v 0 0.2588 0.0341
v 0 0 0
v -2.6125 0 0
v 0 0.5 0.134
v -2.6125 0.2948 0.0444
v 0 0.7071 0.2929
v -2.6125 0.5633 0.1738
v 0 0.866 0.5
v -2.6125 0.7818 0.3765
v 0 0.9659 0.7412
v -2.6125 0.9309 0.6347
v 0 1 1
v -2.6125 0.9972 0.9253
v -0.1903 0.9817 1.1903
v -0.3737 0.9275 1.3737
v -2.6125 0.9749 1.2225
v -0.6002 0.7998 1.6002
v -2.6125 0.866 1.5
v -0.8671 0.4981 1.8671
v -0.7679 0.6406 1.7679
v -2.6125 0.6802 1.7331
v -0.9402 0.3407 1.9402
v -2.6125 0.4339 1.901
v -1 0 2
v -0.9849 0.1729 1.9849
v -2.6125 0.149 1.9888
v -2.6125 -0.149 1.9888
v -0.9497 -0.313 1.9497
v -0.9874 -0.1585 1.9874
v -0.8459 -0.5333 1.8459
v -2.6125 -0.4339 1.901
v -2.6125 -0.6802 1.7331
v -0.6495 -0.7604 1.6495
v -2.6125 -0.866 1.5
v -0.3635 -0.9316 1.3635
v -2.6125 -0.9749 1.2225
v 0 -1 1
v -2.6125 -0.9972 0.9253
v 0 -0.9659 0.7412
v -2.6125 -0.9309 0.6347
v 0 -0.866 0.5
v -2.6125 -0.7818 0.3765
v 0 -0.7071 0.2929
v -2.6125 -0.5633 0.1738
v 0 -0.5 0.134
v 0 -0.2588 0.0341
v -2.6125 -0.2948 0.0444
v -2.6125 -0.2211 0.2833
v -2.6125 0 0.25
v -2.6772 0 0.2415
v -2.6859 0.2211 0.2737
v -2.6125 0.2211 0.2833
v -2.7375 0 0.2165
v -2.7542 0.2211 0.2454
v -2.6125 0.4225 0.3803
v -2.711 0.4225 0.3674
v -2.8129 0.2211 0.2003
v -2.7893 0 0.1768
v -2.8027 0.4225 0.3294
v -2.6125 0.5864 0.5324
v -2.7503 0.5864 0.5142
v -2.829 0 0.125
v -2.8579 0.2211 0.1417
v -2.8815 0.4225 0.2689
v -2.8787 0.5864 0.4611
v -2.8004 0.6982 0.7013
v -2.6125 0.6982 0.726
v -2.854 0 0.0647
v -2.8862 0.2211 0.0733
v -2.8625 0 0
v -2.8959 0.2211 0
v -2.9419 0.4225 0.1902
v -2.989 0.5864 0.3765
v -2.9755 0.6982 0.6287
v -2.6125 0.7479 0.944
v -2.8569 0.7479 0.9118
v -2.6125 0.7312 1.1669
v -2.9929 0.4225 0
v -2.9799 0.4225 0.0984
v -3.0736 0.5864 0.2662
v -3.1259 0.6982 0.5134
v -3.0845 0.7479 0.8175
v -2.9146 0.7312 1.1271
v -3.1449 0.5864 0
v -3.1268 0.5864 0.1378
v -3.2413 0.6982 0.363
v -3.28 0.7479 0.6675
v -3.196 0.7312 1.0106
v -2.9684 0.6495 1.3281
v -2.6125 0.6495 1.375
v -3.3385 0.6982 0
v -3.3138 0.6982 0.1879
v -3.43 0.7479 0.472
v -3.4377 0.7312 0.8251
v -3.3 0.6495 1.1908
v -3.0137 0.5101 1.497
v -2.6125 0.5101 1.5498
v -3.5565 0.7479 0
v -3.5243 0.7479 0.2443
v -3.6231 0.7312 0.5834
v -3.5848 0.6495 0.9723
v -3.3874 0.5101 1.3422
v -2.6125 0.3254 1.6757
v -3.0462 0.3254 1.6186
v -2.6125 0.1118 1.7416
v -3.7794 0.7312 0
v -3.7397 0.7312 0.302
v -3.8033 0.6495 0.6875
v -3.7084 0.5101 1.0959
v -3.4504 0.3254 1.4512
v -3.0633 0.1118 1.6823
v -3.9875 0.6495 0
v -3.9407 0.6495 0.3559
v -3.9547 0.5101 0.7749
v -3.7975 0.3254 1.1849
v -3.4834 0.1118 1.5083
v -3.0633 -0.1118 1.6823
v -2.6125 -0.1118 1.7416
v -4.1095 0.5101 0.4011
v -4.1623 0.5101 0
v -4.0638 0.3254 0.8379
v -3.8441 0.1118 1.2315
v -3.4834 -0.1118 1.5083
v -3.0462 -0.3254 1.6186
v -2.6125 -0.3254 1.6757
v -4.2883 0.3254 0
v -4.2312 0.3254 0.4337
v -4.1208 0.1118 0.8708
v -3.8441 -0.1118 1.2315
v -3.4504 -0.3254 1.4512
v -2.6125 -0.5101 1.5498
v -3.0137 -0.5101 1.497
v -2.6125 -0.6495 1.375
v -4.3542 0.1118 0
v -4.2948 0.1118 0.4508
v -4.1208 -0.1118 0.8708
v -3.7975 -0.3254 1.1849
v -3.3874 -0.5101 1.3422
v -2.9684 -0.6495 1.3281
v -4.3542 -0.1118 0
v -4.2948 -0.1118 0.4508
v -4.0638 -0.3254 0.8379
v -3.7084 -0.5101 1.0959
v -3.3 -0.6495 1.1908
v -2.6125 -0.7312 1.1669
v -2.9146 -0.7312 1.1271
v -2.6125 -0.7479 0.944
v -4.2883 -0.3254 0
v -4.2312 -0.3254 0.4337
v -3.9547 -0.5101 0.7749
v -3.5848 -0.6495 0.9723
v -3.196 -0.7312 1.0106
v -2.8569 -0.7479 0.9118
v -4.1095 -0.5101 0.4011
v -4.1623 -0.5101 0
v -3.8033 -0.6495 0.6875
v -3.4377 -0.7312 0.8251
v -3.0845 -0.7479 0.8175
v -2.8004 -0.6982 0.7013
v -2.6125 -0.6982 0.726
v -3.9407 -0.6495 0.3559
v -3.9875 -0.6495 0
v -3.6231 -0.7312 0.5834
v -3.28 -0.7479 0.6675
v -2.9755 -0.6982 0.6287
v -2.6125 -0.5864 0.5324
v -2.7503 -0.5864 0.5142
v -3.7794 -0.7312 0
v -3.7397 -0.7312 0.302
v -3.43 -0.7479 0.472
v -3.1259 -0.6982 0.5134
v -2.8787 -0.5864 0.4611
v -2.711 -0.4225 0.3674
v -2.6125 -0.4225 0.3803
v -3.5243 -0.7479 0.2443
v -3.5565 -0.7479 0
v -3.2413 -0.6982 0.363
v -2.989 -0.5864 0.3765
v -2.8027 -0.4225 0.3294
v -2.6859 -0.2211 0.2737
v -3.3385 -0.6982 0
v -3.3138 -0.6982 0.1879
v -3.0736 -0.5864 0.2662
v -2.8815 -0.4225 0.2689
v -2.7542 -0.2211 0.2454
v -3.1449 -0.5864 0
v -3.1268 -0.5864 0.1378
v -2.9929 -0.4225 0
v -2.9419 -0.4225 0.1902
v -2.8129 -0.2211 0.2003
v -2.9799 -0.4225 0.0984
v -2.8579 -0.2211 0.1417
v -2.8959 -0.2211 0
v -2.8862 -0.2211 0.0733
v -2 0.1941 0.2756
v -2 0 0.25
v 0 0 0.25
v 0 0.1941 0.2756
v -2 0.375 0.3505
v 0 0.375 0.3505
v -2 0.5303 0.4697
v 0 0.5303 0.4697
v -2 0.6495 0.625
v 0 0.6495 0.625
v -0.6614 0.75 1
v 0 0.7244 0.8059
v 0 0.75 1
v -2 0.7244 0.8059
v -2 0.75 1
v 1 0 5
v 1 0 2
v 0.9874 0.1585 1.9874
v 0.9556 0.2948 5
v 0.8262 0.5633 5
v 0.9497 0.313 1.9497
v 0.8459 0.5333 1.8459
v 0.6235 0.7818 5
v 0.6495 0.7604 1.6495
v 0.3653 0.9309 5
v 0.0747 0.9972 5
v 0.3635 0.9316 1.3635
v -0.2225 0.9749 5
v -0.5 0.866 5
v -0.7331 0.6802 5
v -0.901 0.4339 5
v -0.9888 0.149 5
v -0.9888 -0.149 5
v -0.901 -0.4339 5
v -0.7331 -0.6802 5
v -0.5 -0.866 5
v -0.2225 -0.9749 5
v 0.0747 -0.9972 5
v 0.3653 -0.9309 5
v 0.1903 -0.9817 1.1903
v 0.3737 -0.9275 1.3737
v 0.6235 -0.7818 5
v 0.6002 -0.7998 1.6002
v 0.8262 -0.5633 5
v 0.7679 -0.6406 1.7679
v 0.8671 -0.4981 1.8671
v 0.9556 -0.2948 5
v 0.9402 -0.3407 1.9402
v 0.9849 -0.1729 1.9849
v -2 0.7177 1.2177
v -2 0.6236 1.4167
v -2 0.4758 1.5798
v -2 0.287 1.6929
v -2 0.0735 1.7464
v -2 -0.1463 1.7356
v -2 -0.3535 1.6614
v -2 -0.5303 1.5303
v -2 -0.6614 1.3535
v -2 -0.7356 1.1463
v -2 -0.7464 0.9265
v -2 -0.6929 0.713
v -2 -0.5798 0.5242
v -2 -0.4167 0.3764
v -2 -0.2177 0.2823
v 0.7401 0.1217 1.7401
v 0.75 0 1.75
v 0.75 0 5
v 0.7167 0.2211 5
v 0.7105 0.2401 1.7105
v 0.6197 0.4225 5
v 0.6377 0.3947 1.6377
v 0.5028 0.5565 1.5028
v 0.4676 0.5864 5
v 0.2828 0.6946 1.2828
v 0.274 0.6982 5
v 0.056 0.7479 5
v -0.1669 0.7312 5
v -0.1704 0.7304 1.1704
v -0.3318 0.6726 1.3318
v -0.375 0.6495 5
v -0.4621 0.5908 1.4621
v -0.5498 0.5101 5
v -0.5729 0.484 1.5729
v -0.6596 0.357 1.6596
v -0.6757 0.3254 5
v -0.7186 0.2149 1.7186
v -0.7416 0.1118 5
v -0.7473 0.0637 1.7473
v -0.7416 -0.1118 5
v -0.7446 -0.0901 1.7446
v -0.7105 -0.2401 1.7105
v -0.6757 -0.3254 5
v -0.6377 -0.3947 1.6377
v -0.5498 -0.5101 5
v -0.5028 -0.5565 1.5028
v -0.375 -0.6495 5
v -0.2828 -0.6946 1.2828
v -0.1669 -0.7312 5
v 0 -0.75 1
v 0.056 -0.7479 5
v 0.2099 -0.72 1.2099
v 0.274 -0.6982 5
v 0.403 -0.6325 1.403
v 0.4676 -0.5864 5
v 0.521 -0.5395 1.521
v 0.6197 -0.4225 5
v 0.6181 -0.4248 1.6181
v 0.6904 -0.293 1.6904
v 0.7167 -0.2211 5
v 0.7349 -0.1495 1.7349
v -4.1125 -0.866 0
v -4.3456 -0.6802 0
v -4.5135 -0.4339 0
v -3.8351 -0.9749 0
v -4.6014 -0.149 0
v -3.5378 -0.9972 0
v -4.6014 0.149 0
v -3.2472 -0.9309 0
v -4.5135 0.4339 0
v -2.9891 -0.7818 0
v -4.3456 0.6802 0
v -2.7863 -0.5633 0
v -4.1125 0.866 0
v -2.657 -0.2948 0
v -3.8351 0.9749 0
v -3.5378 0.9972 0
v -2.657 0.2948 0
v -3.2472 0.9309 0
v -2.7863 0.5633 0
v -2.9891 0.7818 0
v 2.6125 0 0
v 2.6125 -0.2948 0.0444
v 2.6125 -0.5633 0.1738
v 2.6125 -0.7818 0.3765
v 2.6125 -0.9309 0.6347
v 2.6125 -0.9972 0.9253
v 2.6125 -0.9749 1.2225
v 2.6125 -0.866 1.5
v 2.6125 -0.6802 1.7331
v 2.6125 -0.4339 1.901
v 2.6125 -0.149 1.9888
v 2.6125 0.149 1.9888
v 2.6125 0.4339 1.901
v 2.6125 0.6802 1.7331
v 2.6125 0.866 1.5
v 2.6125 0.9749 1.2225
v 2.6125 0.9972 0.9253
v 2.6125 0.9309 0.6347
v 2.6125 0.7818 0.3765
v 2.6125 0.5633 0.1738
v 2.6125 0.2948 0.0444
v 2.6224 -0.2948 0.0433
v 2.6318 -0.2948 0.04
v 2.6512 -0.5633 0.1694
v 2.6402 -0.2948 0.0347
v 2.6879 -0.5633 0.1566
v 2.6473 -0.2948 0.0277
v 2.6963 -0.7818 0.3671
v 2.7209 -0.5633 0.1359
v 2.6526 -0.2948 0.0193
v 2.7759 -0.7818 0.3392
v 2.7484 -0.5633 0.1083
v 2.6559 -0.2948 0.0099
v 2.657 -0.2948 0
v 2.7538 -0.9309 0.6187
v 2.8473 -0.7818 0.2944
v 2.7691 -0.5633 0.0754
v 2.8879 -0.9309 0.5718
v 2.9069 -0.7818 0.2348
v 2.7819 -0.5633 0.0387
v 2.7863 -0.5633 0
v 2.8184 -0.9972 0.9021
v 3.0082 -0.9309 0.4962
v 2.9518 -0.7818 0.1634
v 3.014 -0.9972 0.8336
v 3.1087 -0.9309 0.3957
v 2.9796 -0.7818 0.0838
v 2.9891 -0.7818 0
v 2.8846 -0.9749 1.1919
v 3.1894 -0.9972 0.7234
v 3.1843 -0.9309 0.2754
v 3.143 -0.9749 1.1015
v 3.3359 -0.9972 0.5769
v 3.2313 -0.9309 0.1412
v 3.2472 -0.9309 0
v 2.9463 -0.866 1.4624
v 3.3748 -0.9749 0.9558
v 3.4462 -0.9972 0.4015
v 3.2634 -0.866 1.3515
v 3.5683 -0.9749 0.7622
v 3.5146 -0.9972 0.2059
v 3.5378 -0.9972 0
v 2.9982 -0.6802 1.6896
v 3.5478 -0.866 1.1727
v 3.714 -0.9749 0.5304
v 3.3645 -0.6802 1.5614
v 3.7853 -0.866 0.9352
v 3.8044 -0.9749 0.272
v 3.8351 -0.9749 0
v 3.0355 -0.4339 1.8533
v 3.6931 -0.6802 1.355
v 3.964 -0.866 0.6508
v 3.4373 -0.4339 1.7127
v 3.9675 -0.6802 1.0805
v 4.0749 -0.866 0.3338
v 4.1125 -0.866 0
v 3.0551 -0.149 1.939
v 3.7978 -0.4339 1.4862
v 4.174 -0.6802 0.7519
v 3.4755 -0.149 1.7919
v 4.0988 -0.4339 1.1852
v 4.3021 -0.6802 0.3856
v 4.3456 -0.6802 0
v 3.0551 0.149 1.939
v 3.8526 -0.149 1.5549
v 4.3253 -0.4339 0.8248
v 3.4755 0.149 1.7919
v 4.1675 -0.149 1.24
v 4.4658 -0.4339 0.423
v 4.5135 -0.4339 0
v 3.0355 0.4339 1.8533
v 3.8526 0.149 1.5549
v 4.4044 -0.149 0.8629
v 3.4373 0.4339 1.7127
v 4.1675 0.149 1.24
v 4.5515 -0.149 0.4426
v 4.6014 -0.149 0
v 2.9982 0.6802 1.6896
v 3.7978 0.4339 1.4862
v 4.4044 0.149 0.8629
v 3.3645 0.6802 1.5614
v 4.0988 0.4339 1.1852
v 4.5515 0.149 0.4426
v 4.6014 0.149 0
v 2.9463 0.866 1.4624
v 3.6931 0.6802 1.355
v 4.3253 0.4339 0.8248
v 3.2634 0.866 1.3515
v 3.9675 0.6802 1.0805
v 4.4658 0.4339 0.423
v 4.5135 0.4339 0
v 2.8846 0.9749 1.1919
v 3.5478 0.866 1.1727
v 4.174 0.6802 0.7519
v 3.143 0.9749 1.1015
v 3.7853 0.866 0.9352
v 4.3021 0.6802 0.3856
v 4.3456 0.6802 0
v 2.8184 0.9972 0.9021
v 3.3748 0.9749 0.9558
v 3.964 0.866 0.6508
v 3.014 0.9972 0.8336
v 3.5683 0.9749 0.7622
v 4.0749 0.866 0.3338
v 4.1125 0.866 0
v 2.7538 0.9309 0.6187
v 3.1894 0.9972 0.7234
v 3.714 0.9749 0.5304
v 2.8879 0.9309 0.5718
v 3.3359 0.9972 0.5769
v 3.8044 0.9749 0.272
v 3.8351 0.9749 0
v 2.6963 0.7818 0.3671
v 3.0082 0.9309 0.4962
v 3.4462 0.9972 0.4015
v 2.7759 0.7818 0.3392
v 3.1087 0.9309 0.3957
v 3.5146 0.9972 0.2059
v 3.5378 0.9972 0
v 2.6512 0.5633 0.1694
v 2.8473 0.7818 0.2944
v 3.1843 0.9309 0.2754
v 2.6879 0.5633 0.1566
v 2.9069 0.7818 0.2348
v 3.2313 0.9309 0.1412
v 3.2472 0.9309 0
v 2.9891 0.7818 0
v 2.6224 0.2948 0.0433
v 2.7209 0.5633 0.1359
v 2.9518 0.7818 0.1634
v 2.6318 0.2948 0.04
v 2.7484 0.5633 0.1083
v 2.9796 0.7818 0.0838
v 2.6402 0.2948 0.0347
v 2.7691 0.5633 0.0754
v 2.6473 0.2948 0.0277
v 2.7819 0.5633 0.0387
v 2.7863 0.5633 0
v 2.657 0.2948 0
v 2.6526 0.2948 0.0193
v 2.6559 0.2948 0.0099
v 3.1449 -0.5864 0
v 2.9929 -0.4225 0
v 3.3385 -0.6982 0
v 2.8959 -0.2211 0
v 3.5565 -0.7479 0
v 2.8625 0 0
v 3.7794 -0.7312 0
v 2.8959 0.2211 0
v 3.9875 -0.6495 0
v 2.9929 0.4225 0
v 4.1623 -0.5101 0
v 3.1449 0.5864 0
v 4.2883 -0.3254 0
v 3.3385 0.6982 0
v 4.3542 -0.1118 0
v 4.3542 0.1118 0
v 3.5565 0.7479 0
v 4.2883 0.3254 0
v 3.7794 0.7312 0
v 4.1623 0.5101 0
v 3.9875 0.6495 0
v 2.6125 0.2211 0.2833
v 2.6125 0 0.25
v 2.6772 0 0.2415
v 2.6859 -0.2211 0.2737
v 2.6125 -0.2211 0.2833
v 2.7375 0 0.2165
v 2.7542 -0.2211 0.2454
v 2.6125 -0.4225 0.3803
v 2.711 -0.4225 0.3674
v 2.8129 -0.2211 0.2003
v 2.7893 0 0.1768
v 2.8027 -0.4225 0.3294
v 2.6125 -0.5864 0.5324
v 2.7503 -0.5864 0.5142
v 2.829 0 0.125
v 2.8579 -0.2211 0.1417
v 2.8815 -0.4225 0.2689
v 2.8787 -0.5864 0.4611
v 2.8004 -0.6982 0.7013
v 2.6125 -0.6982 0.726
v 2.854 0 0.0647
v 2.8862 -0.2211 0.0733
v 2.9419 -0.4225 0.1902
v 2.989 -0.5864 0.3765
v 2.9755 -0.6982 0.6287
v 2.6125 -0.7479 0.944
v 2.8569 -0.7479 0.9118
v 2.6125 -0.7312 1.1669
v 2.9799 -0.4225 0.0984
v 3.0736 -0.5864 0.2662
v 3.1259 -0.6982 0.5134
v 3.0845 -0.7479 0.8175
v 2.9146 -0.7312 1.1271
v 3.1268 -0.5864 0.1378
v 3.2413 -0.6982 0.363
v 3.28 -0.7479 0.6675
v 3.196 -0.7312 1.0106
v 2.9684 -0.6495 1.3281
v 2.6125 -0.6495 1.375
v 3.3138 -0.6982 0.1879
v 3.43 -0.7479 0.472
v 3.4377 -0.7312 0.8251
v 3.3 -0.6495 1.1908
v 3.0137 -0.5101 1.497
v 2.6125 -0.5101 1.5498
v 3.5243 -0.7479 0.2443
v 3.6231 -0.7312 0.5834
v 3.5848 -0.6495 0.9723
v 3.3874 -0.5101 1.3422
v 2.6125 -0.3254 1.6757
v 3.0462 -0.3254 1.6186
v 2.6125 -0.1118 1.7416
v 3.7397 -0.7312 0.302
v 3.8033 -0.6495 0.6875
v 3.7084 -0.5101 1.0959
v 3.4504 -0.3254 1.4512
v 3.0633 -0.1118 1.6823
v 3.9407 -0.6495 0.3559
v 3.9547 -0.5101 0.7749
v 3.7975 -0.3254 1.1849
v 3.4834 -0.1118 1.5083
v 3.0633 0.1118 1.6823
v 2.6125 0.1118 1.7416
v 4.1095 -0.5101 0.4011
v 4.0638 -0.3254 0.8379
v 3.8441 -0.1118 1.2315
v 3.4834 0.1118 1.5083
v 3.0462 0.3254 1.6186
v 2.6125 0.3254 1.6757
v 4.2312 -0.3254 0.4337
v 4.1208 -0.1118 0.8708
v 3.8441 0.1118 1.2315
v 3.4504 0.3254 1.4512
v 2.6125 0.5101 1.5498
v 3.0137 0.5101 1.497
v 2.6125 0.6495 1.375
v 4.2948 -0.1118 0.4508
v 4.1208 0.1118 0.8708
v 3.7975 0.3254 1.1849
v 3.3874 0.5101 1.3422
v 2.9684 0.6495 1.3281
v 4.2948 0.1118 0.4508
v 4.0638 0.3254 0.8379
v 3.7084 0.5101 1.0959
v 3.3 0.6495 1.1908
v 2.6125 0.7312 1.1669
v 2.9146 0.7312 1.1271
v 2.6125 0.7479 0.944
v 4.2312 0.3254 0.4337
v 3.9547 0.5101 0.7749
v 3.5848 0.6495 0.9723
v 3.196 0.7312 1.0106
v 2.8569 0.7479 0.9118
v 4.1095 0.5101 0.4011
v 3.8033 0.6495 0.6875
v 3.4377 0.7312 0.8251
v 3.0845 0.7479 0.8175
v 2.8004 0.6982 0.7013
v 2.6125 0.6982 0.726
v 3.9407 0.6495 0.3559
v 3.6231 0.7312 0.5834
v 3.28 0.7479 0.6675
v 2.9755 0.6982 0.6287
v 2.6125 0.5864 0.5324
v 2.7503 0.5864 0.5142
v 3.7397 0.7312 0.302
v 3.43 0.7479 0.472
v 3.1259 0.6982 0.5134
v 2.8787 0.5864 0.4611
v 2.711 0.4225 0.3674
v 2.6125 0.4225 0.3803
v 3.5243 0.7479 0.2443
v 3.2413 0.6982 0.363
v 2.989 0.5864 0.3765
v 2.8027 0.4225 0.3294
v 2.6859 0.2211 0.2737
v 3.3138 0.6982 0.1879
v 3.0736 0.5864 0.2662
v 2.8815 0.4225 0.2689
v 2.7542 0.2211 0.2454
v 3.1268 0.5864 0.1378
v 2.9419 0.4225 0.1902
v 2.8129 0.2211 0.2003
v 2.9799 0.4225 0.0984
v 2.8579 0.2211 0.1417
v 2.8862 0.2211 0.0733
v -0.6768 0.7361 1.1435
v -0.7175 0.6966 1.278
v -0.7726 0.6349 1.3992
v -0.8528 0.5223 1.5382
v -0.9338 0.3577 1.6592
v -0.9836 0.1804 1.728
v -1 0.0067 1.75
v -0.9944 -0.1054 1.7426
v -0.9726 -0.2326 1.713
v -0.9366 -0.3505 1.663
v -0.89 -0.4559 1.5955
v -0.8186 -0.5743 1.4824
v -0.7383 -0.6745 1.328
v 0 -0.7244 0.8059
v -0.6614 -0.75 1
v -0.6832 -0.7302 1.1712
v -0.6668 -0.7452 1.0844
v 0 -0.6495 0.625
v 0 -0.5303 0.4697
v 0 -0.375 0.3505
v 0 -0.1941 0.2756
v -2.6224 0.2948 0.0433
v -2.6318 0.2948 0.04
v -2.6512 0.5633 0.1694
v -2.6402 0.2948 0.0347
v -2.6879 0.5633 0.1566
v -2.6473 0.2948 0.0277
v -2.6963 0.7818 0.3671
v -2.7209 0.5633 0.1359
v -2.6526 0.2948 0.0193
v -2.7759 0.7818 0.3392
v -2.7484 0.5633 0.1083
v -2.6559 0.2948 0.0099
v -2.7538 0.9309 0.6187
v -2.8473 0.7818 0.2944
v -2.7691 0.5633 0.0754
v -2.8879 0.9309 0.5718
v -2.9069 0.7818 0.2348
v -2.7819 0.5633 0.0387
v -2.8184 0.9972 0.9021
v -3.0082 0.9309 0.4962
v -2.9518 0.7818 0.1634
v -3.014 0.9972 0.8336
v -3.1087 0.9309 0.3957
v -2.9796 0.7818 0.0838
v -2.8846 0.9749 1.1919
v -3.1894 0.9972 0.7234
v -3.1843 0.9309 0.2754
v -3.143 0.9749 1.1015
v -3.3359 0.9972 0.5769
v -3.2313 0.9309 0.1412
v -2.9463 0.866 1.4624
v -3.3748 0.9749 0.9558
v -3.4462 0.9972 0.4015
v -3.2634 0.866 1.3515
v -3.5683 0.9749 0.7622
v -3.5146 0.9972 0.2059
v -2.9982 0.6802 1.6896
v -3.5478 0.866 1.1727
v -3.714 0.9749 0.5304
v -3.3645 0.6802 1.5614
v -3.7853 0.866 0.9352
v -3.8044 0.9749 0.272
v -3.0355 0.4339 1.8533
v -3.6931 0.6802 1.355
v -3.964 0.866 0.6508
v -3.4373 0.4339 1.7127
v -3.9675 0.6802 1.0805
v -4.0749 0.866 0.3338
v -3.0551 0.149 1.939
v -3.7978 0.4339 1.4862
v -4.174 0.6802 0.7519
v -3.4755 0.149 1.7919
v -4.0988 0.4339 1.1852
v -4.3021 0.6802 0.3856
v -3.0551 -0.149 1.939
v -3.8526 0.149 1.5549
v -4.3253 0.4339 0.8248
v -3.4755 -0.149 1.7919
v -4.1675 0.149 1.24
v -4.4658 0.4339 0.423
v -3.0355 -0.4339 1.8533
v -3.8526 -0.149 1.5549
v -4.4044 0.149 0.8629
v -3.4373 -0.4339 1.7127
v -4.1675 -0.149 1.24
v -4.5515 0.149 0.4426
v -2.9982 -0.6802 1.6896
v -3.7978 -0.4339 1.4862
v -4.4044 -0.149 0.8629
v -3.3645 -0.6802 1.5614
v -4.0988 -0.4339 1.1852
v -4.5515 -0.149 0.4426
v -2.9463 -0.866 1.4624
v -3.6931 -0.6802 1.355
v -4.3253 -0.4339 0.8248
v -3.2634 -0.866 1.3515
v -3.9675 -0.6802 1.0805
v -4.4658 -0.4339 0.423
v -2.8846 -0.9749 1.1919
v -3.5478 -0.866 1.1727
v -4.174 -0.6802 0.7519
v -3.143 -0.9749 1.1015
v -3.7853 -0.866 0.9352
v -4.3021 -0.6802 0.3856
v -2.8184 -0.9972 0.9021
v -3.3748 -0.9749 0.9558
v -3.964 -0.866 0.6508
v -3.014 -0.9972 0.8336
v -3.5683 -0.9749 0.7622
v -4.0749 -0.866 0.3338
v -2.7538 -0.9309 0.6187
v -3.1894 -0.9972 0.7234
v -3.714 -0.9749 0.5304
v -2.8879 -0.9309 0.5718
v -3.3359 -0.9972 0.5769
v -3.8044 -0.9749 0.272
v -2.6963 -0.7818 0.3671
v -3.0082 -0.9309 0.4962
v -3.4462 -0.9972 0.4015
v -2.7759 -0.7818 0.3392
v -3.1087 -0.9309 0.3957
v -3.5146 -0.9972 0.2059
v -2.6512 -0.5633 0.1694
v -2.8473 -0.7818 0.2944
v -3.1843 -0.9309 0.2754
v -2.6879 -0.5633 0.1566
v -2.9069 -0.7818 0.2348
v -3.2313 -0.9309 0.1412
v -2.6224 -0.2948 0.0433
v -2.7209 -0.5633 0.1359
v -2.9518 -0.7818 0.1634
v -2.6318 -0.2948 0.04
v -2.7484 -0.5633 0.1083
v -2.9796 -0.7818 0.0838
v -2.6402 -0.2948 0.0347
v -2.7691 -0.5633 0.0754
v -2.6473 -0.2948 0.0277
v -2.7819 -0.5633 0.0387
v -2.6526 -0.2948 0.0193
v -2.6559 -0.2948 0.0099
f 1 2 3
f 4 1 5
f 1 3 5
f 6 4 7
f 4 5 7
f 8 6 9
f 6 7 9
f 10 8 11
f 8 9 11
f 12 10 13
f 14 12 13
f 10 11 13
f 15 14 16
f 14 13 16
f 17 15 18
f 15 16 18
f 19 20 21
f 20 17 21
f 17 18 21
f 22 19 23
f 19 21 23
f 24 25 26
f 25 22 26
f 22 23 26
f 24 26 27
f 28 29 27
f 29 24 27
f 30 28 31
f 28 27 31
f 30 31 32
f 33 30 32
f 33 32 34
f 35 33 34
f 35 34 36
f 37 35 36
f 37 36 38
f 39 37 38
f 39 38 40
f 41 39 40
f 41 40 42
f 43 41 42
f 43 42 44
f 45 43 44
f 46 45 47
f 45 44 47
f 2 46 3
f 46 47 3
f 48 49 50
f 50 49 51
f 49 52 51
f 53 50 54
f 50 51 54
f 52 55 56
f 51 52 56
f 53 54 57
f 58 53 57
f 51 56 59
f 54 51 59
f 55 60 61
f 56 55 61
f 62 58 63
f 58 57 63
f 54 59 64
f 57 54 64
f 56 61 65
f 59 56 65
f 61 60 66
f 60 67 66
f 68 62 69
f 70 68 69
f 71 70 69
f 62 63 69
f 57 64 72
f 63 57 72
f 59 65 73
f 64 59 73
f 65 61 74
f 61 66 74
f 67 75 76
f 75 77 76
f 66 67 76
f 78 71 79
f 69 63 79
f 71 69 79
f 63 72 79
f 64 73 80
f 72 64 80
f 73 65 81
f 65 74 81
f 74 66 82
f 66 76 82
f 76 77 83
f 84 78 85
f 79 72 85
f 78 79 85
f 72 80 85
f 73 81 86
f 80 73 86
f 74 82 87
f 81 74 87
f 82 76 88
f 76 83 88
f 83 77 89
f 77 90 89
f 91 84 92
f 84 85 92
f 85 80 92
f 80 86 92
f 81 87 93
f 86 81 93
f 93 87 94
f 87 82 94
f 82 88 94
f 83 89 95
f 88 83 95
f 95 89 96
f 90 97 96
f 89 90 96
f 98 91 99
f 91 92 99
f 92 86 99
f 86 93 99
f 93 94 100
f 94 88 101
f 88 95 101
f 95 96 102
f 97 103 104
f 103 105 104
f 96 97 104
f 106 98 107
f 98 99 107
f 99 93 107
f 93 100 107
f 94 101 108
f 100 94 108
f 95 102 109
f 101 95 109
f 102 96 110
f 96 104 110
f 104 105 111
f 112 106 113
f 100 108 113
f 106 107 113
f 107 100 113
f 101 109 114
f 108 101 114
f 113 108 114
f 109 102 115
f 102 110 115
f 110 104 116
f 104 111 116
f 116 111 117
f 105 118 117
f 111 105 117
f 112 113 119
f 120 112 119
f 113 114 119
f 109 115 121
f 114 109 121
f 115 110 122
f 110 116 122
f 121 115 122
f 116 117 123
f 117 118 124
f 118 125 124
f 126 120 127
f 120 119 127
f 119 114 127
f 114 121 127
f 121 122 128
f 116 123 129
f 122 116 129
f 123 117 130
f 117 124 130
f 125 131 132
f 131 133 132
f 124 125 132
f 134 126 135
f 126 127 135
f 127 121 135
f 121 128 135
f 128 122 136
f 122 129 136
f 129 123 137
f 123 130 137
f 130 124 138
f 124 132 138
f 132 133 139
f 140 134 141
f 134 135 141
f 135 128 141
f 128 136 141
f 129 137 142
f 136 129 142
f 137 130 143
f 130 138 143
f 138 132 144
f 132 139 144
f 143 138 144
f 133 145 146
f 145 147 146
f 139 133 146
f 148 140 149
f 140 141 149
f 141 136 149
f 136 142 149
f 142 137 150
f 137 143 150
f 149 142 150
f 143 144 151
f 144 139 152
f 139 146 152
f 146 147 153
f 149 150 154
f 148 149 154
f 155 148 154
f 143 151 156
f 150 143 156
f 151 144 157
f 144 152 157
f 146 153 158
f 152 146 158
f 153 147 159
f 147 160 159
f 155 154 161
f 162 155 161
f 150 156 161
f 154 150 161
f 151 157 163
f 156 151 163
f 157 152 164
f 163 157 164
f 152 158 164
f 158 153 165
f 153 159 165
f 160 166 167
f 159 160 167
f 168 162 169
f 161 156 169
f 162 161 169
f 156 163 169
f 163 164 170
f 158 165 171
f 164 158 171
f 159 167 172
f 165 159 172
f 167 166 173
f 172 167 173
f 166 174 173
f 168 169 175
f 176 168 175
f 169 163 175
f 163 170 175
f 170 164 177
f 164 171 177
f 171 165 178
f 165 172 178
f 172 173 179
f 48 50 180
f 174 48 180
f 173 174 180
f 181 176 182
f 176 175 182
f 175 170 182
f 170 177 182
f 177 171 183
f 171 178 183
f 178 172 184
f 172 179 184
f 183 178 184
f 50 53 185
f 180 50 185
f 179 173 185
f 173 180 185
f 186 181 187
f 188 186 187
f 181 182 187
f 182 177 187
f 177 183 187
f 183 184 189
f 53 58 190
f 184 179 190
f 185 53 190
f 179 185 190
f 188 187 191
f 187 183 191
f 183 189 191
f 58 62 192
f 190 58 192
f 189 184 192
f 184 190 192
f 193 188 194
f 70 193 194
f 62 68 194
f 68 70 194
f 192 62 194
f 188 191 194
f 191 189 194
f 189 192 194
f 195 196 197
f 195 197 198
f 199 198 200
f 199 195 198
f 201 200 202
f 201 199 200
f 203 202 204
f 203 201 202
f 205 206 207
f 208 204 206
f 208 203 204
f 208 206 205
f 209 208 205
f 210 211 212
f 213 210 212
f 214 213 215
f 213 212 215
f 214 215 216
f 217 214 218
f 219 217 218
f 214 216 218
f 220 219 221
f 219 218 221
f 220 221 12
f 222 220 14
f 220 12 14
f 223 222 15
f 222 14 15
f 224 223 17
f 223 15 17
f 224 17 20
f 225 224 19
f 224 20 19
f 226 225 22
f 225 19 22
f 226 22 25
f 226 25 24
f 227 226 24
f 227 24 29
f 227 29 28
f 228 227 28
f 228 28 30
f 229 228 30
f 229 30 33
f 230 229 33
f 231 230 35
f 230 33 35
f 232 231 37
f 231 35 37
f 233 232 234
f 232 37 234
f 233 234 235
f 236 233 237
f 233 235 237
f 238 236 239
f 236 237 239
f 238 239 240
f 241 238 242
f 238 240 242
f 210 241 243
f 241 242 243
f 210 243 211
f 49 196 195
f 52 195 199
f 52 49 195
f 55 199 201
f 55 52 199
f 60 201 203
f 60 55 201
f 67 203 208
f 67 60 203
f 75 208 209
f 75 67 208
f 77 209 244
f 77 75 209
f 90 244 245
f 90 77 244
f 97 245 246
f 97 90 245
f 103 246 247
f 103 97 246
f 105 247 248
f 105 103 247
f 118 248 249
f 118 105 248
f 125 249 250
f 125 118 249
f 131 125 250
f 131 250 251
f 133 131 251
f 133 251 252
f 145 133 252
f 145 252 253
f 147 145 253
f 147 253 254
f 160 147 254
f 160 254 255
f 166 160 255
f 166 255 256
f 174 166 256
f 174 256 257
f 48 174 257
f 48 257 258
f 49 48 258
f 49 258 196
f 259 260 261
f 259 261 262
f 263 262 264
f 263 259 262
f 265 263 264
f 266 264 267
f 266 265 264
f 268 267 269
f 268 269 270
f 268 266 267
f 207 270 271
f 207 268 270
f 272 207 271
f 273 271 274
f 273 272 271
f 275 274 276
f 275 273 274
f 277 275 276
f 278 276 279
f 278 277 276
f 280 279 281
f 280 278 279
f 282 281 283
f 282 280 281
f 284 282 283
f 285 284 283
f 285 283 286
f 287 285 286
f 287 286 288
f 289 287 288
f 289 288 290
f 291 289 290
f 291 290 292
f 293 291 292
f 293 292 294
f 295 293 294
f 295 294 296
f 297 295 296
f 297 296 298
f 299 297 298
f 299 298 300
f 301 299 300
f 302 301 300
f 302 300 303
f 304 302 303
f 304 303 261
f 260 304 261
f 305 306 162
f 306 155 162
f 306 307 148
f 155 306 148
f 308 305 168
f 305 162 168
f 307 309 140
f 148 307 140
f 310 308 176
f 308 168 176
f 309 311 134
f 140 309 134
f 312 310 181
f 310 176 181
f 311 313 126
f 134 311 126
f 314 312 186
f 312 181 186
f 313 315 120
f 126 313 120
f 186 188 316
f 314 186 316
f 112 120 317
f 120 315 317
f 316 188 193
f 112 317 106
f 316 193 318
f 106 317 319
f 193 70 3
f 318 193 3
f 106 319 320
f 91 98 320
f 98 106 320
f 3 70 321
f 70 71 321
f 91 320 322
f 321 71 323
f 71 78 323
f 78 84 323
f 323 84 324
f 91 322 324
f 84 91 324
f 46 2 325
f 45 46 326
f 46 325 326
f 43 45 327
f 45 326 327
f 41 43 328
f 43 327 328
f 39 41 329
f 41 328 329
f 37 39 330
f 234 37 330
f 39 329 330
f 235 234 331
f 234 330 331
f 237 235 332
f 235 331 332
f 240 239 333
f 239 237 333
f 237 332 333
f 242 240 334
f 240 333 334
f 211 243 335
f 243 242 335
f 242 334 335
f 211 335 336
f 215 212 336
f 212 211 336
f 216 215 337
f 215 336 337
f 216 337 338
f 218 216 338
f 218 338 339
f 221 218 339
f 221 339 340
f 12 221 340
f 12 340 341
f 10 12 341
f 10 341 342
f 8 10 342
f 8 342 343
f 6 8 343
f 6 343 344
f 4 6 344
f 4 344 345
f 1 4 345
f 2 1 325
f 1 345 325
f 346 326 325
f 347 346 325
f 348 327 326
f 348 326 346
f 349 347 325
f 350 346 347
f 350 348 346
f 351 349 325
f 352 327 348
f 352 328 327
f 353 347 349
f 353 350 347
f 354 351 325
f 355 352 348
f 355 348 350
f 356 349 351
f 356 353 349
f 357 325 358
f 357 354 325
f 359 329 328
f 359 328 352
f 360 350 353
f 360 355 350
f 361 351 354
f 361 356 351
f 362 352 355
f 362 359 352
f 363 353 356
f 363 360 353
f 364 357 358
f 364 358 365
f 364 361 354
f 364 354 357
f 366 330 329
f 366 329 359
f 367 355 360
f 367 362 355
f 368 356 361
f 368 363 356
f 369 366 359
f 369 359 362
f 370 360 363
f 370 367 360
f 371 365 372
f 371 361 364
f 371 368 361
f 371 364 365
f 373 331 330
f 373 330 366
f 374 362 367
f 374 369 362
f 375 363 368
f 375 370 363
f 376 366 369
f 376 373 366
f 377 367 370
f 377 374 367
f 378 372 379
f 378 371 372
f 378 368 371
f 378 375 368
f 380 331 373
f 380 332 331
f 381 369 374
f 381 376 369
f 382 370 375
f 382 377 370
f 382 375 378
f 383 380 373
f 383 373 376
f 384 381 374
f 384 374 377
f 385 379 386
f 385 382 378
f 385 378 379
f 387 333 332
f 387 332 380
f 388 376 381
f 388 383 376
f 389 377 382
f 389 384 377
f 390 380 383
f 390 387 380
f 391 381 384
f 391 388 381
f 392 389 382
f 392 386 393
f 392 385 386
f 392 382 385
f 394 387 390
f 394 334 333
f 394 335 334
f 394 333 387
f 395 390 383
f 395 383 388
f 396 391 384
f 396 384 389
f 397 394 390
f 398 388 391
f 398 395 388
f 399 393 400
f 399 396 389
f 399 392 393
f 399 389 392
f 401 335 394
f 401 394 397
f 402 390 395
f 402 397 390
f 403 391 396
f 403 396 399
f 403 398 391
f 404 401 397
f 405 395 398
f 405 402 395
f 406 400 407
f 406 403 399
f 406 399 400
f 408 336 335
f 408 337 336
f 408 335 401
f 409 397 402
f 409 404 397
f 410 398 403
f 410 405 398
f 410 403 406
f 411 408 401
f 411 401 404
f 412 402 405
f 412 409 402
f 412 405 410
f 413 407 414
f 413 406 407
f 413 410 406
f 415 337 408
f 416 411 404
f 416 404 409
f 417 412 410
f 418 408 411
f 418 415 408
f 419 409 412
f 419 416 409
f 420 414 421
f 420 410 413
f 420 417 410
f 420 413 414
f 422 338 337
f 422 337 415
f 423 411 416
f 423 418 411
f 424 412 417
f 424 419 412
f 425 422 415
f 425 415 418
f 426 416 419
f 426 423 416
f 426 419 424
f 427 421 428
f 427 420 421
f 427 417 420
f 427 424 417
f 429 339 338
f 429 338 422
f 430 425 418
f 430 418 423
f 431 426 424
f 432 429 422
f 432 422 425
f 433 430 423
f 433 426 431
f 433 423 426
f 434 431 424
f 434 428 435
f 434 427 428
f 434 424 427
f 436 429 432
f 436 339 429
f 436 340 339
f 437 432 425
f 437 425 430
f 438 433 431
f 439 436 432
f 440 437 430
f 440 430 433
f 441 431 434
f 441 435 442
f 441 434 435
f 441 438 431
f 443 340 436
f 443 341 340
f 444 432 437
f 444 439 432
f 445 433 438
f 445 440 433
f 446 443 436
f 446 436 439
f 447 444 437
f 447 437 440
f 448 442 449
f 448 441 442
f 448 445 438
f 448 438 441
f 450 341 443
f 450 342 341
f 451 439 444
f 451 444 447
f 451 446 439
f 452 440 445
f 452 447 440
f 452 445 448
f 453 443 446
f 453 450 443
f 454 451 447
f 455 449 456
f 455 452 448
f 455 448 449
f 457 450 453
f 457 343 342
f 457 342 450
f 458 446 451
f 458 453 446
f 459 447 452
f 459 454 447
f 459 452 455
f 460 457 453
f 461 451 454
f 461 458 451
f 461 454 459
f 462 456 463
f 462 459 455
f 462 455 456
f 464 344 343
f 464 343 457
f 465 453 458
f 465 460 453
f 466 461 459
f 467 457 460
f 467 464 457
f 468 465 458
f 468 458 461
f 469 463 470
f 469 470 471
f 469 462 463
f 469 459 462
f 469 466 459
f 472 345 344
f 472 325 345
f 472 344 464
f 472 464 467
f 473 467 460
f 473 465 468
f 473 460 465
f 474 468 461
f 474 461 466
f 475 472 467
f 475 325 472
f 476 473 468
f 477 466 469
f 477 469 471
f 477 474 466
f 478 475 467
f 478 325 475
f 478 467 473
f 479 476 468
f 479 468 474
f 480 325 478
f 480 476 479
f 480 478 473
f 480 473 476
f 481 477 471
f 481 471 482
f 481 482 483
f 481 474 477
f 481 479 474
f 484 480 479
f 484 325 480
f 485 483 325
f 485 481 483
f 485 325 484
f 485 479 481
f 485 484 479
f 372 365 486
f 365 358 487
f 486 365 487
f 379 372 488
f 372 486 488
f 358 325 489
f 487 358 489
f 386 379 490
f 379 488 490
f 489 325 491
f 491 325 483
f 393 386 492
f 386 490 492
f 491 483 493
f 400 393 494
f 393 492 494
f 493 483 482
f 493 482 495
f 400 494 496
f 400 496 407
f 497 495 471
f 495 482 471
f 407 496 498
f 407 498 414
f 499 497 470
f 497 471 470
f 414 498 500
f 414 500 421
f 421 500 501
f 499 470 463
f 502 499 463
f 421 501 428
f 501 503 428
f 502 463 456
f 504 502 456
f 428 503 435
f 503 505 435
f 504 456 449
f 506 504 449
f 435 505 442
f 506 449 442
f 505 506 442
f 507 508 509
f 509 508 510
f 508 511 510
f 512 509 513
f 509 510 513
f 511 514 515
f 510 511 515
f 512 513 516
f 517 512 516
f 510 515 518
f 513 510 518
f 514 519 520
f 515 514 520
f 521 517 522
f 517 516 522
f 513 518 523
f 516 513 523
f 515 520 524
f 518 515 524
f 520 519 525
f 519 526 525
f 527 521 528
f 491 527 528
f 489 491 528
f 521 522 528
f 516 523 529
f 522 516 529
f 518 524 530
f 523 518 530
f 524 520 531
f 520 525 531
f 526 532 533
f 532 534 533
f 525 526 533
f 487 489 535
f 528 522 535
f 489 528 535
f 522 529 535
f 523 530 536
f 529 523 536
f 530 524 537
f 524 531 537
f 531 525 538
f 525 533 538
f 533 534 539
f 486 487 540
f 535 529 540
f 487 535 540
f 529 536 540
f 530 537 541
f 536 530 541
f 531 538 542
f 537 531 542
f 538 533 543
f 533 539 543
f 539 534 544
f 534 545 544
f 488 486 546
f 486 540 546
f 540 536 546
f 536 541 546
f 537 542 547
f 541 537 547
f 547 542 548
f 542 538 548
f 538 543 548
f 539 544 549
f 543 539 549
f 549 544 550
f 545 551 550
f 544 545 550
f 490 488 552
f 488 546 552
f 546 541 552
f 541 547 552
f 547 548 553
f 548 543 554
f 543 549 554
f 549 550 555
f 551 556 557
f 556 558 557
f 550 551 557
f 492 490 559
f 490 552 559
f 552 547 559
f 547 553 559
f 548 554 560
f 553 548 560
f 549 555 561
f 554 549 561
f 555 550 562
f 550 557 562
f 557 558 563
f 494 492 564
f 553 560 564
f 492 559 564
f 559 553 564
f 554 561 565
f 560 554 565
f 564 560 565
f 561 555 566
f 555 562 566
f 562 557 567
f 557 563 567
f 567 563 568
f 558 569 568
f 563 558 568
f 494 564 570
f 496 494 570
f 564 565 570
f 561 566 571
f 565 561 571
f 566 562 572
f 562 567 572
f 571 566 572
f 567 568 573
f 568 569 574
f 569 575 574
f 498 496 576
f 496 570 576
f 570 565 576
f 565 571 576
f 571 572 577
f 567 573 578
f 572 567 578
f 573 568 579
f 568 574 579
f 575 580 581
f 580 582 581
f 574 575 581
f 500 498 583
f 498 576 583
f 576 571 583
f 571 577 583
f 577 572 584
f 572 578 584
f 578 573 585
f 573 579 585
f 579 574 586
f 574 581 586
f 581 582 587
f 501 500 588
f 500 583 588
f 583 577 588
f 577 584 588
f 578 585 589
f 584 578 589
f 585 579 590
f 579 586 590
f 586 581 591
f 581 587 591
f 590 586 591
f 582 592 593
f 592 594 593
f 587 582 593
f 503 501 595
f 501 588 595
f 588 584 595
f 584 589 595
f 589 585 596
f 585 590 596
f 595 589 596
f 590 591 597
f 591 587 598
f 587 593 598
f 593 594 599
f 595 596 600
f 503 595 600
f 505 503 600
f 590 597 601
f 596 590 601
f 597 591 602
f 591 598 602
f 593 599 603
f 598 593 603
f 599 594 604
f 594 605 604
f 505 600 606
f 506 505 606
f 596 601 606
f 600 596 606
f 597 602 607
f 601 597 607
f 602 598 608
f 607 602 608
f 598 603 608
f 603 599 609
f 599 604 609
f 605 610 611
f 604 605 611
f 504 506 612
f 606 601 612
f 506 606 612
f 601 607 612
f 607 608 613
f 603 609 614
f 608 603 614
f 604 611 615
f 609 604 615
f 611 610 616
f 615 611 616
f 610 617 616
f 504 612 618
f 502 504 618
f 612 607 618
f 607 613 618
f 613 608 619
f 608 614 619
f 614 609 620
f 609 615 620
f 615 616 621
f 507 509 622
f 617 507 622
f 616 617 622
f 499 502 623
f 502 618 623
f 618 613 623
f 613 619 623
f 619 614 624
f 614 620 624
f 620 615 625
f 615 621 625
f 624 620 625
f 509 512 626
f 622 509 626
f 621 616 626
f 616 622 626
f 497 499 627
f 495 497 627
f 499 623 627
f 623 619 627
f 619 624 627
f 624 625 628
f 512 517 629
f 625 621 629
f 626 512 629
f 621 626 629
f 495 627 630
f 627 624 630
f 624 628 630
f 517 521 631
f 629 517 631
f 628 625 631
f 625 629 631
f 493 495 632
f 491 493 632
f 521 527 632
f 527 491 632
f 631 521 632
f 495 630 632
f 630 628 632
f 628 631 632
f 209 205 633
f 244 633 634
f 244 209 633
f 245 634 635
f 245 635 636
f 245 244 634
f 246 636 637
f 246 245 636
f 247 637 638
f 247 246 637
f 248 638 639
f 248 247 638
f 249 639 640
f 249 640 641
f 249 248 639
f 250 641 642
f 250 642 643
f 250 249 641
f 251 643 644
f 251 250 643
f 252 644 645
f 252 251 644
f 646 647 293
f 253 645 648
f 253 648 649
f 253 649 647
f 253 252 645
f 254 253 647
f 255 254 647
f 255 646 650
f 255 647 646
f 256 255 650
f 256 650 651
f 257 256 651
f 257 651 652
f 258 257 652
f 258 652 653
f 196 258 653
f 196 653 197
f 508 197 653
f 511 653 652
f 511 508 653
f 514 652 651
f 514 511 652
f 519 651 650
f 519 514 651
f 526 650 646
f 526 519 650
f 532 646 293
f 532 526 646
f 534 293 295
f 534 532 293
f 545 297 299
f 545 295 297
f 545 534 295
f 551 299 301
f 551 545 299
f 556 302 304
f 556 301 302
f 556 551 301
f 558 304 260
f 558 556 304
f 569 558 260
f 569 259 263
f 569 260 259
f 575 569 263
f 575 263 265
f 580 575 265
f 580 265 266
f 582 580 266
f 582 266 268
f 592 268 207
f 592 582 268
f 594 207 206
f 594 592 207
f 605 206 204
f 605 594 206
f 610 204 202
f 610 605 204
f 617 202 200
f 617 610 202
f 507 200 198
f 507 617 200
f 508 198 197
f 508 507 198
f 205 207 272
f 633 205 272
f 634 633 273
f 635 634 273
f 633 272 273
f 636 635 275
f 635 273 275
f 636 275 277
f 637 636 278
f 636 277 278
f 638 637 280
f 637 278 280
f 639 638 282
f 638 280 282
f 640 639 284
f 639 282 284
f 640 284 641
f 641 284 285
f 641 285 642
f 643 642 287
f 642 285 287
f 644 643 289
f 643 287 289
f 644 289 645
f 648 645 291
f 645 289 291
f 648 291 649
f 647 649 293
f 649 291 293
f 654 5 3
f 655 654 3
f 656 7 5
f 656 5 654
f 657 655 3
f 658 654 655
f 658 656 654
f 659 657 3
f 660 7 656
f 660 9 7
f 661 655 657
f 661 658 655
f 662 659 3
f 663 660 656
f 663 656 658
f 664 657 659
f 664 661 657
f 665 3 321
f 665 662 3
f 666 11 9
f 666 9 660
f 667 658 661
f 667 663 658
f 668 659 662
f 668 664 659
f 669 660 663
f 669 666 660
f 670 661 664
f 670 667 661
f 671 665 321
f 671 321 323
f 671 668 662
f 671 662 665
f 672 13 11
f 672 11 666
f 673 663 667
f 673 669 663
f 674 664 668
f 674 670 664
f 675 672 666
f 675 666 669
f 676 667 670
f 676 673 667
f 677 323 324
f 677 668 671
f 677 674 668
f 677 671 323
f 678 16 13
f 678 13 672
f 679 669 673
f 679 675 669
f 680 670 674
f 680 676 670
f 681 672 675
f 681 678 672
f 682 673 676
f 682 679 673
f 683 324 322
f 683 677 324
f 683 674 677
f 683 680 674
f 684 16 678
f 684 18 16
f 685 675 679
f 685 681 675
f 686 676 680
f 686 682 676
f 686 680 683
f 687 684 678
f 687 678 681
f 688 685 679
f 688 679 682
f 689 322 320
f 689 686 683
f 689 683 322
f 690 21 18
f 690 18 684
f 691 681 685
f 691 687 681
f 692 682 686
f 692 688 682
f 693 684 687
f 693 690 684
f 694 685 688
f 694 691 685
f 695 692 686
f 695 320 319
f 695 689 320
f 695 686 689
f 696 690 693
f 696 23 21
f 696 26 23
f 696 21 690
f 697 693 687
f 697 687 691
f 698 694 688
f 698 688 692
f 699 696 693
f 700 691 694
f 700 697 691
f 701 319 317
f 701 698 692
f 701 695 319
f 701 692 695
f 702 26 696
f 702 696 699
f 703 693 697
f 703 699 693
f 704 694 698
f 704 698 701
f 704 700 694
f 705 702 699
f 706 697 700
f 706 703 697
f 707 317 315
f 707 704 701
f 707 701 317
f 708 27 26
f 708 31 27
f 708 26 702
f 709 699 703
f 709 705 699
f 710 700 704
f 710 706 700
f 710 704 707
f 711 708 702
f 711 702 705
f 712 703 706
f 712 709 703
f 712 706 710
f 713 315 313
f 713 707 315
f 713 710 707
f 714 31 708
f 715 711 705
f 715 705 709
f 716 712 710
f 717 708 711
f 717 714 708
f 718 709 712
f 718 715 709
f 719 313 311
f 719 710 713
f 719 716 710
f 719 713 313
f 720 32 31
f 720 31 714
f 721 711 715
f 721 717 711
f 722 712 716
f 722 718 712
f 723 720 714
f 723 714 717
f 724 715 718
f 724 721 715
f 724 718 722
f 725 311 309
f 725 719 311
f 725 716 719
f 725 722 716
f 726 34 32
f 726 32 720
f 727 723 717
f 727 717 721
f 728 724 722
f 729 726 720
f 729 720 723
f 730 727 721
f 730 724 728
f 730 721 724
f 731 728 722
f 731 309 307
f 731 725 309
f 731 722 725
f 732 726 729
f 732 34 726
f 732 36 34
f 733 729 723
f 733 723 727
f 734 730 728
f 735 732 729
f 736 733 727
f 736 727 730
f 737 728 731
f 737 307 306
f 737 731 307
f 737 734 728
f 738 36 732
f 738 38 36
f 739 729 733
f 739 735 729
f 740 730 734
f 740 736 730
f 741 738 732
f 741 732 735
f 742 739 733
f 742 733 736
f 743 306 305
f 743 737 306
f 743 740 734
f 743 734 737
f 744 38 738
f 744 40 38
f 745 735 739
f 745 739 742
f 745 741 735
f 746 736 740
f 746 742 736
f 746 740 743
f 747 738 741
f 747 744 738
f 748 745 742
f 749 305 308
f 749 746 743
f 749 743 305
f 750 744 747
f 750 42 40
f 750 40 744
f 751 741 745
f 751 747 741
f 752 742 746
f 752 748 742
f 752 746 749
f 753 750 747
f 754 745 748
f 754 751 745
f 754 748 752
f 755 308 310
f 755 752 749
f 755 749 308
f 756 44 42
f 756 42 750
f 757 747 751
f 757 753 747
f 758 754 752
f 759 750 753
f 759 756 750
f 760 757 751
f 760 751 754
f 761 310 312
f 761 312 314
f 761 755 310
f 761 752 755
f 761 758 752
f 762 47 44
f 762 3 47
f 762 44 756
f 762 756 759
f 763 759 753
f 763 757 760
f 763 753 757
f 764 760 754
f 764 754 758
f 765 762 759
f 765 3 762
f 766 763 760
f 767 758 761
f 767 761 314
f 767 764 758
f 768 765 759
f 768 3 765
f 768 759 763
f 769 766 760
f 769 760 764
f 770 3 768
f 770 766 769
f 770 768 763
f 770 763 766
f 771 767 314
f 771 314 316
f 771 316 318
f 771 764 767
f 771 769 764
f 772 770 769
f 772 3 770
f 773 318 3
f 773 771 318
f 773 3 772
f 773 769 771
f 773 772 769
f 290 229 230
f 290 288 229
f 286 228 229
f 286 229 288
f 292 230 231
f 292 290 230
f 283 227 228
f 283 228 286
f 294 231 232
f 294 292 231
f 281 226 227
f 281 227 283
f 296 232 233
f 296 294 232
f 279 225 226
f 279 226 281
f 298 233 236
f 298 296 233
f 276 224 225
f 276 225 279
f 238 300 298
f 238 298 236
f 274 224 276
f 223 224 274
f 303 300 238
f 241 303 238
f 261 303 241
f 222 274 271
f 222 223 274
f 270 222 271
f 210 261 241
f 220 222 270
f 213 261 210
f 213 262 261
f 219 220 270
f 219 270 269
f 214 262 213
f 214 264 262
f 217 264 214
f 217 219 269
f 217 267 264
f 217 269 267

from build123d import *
from build123d import SkipClean  # not in build123d's __all__

# Parameters (mm, degrees)
F0_R      = 1
F0_R_2    = 0.75
F4_DEPTH  = 2.61254
F5_DEPTH  = 2.61254
F8_R      = 1
F8_R_2    = 0.75
F9_DEPTH  = 4
F10_R     = 0.75
F11_DEPTH = 4
F13_R     = 0.75
F14_DEPTH = 4


# Not quite as in the source:
# - after a boolean that leaves OpenCascade's solid faulty, fix() repairs it


with BuildPart() as f2:
    # F2: sweep along a path in F1
    with BuildLine(Plane.XZ) as f2_path:
        ThreePointArc((-2.61254, 1), (-3.3196467812, 0.7071067812), (-3.61254, 0))
    # F0 (on Top) → F2 (sweep)
    with BuildSketch(Plane.XY):
        with Locations((-3.61254, 0)):
            Circle(F0_R)
        with Locations((-3.61254, 0)):
            Circle(F0_R_2, mode=Mode.SUBTRACT)
    sweep(path=f2_path.line)

    # F5 (add): a face of the model
    f5_faces = [f2.faces().sort_by_distance(p)[0] for p in [
        (-2.61254, 0, 1.9717157288),
    ]]


with BuildPart() as f3:
    # F3: sweep along a path in F1
    with BuildLine(Plane.XZ) as f3_path:
        ThreePointArc((2.61254, 1), (3.3196467812, 0.7071067812), (3.61254, 0))
    # F0 (on Top) → F3 (sweep)
    with BuildSketch(Plane.XY):
        with BuildLine():
            ThreePointArc((4.61254, 0), (3.61254, 1), (2.61254, 0))
            ThreePointArc((2.61254, 0), (3.61254, -1), (4.61254, 0))
        make_face()
        with BuildLine():
            ThreePointArc((4.36254, 0), (3.61254, -0.75), (2.86254, 0))
            ThreePointArc((2.86254, 0), (3.61254, 0.75), (4.36254, 0))
        make_face(mode=Mode.SUBTRACT)
    sweep(path=f3_path.line)

    # F4 (add): a face of the model
    f4_faces = [f3.faces().sort_by_distance(p)[0] for p in [
        (2.61254, 0.9717157288, 1),
    ]]
    extrude(f4_faces, amount=F4_DEPTH)


with BuildPart() as f2_1:
    add(f2.part, clean=False)

    add(f3.part)  # F5 merges F3
    extrude(f5_faces, amount=F5_DEPTH)

    # F6: union 

    # F8 (on offset) → F9 (join)
    with BuildSketch(Plane.XY.offset(1)):
        Circle(F8_R)
        Circle(F8_R_2, mode=Mode.SUBTRACT)
    with SkipClean():  # cleaning this boolean's faces spoils the solid; the shape is the same uncleaned
        extrude(amount=F9_DEPTH)

    # F10 (on face) → F11 (cut)
    with BuildSketch(Plane.XY.offset(5)):
        Circle(F10_R)
    extrude(amount=-F11_DEPTH, mode=Mode.SUBTRACT)

    add(f2_1.part.fix(), mode=Mode.REPLACE)

    # F13 (on offset) → F14 (cut)
    with BuildSketch(Plane.YZ.offset(2)):
        with Locations((0, 1)):
            Circle(F13_R)
    extrude(amount=-F14_DEPTH, mode=Mode.SUBTRACT)


solid = f2_1.part
